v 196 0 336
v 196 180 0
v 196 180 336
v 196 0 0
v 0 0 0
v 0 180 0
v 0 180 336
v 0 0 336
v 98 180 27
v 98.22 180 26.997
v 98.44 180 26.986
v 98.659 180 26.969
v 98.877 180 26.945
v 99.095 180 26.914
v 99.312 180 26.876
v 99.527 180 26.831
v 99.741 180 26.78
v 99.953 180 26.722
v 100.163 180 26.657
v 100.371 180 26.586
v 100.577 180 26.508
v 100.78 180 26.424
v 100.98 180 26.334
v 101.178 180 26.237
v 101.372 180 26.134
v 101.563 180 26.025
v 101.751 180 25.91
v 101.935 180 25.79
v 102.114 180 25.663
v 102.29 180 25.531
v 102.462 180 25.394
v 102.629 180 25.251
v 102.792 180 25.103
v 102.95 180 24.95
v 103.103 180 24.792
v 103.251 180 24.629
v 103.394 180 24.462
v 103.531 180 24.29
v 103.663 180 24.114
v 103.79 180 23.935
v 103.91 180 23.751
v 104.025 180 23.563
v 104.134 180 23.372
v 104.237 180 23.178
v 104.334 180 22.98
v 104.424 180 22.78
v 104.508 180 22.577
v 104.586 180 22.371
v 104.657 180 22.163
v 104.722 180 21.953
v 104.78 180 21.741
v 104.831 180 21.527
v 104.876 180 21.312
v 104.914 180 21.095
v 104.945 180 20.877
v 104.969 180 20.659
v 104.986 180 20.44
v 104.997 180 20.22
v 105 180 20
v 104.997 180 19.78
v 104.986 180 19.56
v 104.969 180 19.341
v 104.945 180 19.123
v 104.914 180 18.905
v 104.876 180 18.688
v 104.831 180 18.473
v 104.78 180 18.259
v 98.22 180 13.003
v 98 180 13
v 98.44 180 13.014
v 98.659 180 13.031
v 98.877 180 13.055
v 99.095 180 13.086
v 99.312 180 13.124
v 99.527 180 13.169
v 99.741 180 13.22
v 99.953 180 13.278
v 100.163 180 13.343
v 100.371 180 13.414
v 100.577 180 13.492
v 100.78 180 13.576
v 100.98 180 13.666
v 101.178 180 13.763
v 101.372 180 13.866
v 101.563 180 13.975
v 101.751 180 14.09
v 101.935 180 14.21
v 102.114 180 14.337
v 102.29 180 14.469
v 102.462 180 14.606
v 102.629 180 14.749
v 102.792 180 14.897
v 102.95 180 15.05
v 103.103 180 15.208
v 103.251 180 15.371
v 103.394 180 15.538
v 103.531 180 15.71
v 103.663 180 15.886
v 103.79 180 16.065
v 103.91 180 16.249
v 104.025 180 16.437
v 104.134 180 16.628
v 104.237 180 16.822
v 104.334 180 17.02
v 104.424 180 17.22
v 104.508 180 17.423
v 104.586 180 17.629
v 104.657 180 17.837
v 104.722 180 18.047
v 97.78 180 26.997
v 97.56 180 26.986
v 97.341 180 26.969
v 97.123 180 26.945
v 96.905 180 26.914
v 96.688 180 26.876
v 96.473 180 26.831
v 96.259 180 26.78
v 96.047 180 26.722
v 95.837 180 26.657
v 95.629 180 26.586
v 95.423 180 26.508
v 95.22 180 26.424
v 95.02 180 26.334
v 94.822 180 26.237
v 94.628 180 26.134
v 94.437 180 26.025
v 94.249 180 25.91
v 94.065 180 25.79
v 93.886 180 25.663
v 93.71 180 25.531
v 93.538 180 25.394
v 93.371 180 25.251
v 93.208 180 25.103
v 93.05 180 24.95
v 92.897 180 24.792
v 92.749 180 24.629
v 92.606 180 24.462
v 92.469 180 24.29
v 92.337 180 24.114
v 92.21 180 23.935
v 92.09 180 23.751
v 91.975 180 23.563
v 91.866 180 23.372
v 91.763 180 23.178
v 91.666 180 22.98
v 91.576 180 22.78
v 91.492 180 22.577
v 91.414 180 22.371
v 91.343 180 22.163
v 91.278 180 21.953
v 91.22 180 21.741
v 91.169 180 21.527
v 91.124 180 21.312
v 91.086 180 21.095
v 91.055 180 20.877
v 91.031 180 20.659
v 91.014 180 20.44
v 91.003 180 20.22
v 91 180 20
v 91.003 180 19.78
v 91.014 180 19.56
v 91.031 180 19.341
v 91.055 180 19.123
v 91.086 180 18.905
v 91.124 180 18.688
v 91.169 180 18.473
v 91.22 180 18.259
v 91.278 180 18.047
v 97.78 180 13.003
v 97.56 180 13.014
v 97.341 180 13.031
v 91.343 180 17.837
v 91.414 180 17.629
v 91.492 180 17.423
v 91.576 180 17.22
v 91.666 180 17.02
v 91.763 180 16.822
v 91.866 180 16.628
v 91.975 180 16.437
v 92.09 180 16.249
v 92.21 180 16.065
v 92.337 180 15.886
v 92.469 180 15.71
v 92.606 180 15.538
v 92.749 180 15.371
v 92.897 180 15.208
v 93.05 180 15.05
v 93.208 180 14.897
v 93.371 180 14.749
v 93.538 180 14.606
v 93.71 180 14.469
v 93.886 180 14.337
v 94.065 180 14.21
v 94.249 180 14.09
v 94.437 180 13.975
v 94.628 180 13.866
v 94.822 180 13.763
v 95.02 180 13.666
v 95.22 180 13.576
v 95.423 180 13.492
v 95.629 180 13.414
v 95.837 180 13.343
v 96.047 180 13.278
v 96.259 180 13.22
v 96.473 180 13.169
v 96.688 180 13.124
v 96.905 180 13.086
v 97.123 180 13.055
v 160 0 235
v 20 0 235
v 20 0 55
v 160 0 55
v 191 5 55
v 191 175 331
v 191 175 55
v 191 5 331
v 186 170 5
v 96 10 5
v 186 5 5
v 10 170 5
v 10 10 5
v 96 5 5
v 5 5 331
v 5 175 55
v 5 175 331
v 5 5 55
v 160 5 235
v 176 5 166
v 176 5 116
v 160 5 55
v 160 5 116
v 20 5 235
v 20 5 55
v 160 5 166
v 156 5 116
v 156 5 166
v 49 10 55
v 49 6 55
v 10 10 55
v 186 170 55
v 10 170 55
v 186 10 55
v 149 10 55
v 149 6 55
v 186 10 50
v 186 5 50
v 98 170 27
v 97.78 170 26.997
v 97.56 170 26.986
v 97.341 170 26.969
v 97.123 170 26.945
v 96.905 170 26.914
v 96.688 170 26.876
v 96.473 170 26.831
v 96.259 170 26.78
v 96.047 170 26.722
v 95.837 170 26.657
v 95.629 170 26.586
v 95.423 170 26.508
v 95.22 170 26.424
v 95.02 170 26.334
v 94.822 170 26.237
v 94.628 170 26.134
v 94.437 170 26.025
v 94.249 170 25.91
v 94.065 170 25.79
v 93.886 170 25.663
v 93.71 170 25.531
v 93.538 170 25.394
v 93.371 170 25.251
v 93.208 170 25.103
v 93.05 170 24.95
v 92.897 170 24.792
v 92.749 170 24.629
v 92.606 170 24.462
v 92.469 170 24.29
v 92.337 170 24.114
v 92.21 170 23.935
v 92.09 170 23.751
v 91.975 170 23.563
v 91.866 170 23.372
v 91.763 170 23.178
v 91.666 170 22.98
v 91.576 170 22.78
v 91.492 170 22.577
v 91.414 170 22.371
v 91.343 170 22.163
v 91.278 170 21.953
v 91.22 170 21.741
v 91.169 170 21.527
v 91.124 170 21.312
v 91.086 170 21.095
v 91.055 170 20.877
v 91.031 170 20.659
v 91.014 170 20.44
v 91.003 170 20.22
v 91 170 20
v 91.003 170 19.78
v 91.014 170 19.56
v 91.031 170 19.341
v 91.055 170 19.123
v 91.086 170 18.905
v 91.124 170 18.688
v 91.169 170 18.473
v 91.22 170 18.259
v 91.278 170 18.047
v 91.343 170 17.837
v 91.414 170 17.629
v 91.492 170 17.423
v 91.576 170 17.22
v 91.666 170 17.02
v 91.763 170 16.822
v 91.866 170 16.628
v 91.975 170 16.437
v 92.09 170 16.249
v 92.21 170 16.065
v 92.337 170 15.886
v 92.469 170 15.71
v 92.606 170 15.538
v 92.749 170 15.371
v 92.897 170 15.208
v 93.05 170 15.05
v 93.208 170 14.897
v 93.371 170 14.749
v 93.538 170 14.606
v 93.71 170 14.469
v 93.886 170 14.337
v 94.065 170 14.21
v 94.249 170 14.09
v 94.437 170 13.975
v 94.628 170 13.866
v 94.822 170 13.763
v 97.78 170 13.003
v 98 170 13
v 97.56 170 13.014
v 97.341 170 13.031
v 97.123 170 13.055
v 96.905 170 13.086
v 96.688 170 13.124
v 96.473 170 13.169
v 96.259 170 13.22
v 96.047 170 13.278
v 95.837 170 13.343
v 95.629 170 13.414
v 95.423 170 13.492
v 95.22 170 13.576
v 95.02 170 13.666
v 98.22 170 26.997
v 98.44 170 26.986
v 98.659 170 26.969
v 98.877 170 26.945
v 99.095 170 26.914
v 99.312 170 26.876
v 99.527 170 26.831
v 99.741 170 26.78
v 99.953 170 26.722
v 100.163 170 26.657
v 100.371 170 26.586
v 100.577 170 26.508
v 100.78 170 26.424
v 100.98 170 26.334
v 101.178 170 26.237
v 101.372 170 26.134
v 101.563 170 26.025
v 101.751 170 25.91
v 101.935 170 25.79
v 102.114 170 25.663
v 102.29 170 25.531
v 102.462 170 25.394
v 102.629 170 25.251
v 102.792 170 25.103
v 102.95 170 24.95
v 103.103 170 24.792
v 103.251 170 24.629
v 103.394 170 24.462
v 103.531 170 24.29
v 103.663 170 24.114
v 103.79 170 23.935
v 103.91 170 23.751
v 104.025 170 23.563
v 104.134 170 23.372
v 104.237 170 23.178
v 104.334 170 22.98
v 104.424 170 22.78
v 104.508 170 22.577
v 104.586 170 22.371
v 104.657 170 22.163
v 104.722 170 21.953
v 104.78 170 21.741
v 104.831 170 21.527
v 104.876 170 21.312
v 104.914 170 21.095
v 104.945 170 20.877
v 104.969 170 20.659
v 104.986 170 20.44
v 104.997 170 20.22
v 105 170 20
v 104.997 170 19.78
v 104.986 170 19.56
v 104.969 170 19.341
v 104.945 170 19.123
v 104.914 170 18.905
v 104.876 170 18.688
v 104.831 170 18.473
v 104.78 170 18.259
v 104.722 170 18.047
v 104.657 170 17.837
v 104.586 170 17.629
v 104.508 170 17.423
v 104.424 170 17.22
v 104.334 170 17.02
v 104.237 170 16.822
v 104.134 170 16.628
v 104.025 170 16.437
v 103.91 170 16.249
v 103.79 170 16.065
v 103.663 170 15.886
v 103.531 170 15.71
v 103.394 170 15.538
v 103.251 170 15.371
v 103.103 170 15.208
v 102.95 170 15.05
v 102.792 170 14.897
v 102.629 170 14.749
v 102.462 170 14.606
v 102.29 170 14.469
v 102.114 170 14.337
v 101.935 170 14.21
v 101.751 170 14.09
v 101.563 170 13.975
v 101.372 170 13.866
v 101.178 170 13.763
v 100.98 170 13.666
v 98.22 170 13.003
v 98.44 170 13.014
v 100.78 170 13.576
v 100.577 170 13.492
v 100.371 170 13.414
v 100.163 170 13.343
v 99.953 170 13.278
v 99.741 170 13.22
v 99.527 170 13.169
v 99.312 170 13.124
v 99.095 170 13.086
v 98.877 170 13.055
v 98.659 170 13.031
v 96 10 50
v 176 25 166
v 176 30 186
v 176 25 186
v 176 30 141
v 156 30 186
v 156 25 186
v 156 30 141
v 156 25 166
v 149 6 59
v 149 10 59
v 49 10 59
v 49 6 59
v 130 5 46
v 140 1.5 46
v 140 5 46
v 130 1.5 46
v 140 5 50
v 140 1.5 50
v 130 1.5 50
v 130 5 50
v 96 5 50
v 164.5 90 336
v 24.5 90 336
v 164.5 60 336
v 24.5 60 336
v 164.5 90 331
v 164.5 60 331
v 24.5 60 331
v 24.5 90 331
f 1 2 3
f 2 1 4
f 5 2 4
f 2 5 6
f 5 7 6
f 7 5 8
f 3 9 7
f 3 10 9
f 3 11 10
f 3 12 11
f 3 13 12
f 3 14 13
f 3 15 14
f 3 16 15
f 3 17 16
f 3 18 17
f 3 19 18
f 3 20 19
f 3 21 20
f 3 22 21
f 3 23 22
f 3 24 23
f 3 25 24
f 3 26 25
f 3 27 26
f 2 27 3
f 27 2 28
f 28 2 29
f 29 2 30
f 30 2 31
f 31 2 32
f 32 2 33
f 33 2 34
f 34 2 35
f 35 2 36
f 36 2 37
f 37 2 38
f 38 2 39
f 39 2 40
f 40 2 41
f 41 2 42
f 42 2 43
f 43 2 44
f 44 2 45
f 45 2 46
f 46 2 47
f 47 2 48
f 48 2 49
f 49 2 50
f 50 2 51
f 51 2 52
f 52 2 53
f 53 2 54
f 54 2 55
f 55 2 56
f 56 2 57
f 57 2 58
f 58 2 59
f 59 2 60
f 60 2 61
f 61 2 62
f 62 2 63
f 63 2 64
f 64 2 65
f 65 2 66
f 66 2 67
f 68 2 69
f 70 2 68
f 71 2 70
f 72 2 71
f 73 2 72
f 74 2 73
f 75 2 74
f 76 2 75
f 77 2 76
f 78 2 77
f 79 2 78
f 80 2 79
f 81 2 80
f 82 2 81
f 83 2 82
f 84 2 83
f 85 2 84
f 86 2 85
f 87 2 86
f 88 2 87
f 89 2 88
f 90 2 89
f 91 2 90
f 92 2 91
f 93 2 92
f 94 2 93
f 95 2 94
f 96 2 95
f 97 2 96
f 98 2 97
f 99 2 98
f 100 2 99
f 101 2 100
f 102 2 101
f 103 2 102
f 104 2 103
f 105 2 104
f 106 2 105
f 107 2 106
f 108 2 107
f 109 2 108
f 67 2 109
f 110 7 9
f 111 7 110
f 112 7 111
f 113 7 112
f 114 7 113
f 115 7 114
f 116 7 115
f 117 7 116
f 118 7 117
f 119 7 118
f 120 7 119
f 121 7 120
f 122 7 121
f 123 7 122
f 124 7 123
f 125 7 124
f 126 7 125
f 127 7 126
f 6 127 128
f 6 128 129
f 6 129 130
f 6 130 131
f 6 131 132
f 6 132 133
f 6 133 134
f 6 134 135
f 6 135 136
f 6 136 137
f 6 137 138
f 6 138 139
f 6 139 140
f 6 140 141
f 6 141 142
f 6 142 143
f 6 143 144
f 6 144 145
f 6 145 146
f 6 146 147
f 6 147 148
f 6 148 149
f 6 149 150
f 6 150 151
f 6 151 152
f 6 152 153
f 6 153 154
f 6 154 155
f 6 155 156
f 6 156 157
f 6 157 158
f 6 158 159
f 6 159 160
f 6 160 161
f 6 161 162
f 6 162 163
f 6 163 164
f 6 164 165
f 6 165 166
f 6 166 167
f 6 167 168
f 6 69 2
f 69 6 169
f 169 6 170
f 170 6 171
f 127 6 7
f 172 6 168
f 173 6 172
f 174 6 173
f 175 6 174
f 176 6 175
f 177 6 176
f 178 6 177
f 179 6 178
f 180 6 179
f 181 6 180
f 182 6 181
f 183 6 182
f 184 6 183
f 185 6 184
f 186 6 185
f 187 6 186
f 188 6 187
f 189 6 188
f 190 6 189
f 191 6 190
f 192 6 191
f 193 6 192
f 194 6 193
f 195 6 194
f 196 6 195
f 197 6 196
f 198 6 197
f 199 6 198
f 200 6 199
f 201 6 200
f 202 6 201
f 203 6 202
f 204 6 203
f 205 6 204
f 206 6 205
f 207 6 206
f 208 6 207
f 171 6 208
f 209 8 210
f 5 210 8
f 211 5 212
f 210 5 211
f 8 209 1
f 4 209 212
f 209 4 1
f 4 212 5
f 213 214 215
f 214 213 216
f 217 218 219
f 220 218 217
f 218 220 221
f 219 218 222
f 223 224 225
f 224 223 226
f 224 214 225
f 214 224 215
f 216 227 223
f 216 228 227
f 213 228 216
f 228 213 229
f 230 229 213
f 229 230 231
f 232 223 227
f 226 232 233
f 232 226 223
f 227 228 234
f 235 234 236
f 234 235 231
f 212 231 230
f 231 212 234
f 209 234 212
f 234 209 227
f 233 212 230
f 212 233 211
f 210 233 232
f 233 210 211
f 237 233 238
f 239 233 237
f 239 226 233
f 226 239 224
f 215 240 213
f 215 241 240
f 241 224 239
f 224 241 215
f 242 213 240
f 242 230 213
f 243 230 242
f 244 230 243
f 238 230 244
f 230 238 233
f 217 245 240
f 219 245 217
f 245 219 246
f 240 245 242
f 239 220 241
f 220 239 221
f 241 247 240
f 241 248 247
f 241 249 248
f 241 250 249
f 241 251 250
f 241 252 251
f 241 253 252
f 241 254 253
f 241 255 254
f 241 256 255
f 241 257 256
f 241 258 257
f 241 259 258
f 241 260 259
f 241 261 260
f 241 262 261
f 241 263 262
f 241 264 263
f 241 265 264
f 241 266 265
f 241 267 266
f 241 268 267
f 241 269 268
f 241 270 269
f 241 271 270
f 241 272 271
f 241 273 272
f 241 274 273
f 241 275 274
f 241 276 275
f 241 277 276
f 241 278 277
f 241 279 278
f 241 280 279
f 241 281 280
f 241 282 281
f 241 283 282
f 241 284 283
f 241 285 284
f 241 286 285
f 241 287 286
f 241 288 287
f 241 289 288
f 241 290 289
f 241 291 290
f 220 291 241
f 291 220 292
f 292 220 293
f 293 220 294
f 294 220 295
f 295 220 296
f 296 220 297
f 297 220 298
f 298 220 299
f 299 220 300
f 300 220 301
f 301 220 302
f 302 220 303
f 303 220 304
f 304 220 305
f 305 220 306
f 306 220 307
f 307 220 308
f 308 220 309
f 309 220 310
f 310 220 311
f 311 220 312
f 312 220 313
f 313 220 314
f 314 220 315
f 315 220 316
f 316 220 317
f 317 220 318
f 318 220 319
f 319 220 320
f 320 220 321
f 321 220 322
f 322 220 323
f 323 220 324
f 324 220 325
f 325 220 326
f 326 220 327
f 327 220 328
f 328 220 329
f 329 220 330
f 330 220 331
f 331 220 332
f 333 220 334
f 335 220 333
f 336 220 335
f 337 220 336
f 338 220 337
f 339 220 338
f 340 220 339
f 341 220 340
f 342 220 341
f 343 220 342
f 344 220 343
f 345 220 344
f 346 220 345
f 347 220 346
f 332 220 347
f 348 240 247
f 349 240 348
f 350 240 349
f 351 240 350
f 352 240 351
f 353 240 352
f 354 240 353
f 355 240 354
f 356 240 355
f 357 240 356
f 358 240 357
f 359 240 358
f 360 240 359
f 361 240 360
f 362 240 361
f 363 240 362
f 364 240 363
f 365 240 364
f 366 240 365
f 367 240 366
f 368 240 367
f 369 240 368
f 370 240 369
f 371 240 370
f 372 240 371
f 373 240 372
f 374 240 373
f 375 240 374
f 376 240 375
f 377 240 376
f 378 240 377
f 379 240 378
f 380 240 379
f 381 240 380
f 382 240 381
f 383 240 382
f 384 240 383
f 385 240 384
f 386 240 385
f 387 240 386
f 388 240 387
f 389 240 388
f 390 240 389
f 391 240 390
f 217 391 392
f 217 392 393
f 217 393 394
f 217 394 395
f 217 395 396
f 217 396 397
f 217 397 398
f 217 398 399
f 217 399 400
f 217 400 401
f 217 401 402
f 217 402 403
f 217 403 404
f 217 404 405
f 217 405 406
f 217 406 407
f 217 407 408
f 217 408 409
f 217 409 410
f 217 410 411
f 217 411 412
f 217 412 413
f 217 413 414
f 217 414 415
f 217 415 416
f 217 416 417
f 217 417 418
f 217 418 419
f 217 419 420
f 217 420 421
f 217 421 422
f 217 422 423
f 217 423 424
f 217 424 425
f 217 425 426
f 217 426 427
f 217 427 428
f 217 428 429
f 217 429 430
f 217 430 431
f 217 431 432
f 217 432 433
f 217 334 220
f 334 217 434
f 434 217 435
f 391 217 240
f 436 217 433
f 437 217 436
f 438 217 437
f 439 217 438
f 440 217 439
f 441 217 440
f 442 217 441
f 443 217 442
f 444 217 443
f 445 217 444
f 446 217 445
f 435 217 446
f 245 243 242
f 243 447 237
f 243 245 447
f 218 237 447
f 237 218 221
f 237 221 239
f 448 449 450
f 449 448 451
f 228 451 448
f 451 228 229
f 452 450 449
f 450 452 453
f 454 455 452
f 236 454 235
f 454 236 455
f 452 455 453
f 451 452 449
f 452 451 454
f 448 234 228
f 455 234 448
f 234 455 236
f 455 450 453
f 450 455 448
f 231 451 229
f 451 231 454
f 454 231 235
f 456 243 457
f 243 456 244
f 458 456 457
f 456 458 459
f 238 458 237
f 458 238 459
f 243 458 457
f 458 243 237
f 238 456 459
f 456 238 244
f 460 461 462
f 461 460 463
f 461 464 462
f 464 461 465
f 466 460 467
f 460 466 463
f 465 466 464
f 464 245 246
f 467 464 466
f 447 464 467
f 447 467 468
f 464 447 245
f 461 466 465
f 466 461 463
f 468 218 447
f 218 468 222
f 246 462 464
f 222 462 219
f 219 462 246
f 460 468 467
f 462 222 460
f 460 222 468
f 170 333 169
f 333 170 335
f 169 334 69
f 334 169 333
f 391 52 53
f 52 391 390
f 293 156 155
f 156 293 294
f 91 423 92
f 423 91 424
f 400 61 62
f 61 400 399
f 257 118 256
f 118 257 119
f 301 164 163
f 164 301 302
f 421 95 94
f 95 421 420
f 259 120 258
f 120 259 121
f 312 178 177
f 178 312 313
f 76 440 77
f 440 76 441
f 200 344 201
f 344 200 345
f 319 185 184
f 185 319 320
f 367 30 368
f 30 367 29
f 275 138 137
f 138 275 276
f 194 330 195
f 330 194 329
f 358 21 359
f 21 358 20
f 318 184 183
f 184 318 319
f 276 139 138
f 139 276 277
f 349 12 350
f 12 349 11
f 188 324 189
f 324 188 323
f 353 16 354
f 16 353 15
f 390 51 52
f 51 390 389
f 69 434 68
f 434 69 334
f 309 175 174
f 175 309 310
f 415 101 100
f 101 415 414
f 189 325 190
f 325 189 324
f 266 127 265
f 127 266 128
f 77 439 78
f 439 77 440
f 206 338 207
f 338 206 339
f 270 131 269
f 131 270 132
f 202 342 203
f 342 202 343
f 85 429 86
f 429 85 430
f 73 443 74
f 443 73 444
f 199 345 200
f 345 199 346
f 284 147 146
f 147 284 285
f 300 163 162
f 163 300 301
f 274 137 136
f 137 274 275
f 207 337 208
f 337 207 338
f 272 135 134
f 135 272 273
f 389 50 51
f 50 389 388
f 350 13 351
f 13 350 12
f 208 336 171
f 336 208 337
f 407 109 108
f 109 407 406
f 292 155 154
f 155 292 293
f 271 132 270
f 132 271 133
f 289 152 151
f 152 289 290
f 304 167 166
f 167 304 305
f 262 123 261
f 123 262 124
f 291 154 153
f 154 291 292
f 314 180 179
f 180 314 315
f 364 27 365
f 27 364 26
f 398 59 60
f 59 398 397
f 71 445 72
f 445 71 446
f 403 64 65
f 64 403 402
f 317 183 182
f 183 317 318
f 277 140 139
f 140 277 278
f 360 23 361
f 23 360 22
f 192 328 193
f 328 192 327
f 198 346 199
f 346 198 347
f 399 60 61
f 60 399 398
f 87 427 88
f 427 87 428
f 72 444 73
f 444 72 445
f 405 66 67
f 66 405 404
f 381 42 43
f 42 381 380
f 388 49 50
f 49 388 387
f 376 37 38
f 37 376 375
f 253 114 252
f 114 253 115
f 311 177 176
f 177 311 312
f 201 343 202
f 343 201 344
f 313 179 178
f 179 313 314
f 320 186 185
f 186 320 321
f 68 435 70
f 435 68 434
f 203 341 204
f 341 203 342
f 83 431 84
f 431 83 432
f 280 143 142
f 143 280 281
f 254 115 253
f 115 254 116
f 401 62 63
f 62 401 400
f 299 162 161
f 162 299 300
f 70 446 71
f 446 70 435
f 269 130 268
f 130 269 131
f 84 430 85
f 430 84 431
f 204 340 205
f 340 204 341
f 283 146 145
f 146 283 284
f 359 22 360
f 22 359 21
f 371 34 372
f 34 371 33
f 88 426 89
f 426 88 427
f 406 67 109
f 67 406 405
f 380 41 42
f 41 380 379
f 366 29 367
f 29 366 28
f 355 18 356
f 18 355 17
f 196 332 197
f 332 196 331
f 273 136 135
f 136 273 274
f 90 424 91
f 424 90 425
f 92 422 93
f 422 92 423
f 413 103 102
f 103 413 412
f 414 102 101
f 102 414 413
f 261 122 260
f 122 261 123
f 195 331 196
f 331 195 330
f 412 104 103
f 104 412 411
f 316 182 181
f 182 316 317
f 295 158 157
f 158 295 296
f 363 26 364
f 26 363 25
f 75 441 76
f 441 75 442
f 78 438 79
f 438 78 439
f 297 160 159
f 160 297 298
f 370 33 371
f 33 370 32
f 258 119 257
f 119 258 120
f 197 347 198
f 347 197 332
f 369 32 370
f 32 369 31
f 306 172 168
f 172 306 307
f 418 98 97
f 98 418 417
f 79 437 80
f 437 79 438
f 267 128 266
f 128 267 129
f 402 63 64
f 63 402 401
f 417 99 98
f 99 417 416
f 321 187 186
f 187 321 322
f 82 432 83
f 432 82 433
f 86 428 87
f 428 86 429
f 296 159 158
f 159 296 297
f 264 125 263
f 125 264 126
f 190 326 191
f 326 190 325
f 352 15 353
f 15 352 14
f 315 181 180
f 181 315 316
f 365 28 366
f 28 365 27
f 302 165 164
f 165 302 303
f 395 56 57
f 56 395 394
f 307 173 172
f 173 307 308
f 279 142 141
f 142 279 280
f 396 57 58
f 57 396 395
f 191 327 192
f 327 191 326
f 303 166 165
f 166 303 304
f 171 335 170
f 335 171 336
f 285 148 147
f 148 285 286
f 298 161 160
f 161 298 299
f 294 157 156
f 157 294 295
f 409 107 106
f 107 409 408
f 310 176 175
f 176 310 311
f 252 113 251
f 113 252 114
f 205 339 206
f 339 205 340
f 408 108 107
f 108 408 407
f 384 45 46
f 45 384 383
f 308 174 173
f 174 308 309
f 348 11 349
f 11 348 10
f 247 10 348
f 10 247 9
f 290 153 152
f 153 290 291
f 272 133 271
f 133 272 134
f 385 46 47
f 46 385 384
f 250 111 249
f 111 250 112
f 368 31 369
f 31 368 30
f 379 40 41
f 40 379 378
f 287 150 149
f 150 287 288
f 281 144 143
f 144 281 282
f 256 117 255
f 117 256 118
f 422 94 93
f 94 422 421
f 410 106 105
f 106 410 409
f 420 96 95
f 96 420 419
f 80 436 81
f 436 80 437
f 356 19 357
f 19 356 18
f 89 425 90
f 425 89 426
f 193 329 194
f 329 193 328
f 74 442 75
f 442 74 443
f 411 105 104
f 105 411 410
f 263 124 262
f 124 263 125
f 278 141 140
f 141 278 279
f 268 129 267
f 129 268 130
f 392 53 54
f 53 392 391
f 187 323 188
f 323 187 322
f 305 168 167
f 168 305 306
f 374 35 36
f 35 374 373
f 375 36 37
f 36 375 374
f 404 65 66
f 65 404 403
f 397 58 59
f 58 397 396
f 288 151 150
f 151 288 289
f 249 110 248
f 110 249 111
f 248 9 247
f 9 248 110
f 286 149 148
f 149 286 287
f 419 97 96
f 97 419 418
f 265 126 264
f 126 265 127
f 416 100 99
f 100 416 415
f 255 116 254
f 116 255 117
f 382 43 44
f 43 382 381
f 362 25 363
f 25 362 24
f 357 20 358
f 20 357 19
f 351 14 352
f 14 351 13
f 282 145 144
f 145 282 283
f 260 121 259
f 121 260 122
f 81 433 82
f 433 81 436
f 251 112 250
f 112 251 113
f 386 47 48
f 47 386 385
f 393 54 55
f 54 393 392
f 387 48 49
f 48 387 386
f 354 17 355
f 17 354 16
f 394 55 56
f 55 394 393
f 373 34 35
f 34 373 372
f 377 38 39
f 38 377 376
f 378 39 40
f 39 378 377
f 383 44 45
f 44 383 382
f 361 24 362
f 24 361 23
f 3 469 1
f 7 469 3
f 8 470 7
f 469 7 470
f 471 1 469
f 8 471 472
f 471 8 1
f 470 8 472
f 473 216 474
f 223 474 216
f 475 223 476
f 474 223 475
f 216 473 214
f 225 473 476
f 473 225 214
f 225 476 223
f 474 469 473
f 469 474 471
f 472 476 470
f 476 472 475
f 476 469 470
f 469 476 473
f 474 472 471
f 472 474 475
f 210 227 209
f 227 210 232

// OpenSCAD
    anchoBuzon=196;
    fondoBuzon=180;
    altoBuzon =196;
    anchoPared=5;
    anchoPuerta=140;
    altoPuerta=180;
    margen=20;
    margenAlto=55;
    
// TAPA BUZON


//LECTOR
    anchoLector =45;
    altoLector = 90;
    grosorLector = 5;
// AGUJERO ALIMENTACION
diametroAlimentacion = 14;
module base(){

    difference(){
        cube([anchoBuzon,fondoBuzon,altoBuzon]);
        translate([anchoPared,anchoPared,anchoPared])
            cube([anchoBuzon-anchoPared*2,fondoBuzon-anchoPared*2,altoBuzon]);
        translate([anchoBuzon-(anchoBuzon-margen),0,altoBuzon-(altoBuzon-margenAlto)])
            #cube([anchoPuerta,50,altoPuerta]);
            
    }
        
        difference(){
            translate([anchoPared,anchoPared,0])
                cube([anchoBuzon-anchoPared*2,fondoBuzon-anchoPared*2,margenAlto]);
            translate([anchoPared*2,anchoPared*2,0])
                cube([anchoBuzon-anchoPared*4,fondoBuzon-anchoPared*4,margenAlto]);
        }

        
        
    
    translate([anchoBuzon-40,anchoPared,altoBuzon-80])
        cerradura();
    translate([anchoBuzon/4,anchoPared+1,margenAlto])
        cube([100,anchoPared-1,anchoPared-1]);    
}
module baseConLectorYCerradura(){
    difference(){
        base();
        translate([(anchoBuzon/2)-2,anchoPared,anchoLector+anchoPared])
                lector();
    }
}


//cerradura();
module lector(){

    
    rotate([0,90,0])
        union(){
            translate([0,-3.5,34])
                cube([4,5,10]);
            cube([anchoLector,grosorLector,altoLector]);
        }
}

altoCerradura = 70;
module cerradura(){
    difference(){

        difference(){
            
            cube([20,25,altoCerradura]);
                translate([0,0,altoCerradura])
                    rotate([0,90,0])
                        cube([20,20,40]);

        }
            rotate([45,0,0])
                translate([0,0,-20])
                    cube([200,250,20]);
    }
}
module baseCompleta(){
    difference(){
        baseConLectorYCerradura();
        rotate([0,90,90])
            translate([-20,-anchoBuzon/2,fondoBuzon/2])
                #cylinder(r = diametroAlimentacion/2, h = 100, $fn=200);
    }
}
//************************ TAPA *******************************************

baseCompleta();
translate([0,0,altoBuzon])
tapa();


altoTapa = 140;
anchoRanura = 140;
fondoRanura = 30;
desplazamientoRanura = 60;
module tapa(){
    difference(){
        cube([anchoBuzon,fondoBuzon,altoTapa]);
        translate([anchoPared,anchoPared,0])
            cube([anchoBuzon-anchoPared*2,fondoBuzon-anchoPared*2,altoTapa-anchoPared]);
        translate([anchoBuzon/8,desplazamientoRanura,altoTapa-anchoPared])
            cube([anchoRanura,fondoRanura,100]);
        translate([anchoBuzon-(anchoBuzon-margen),0,0])
            cube([anchoPuerta,anchoPared*2,(margenAlto+altoPuerta)-altoBuzon]);
    }
}



module encaje(anchoEncaje,fondoEncaje,altoEncaje){
    difference(){
        cube([anchoEncaje,fondoEncaje,altoEncaje]);
            translate([0,10,-12])
        rotate([40,0,0])
            cube([anchoEncaje,4,altoEncaje*2]);
    }
}
 module tapaConEncajes(){
    fondoEncaje = 3;
    anchoEncaje = 40;
    // mirado dessde detras de la puerta
    // primer encaje justo encima de la puerta
    rotate([0,180,180])
        translate([anchoBuzon/2-20,-anchoPared-fondoEncaje,-margenAlto+5])
            encaje(40,fondoEncaje,15);

    // encaje alante a la derecha
    rotate([0,180,180])
        translate([anchoBuzon-anchoPared-fondoEncaje,-anchoPared,-20])
            rotate([0,0,-90])
                    encaje(40,fondoEncaje,30);
    // encaje atras a la derecha
    rotate([0,180,180])
        translate([anchoBuzon-anchoPared-fondoEncaje,-fondoBuzon+anchoEncaje+anchoPared,-20])
            rotate([0,0,-90])
                    encaje(40,fondoEncaje,30);

    // encaje alante a la izquierda
    rotate([0,180,180])
        translate([fondoEncaje+anchoPared,-anchoPared-anchoEncaje,-20])
            rotate([0,0,90])
                    encaje(anchoEncaje,fondoEncaje,30);
                    
    // encaje atras a la izquierda                
    rotate([0,180,180])
        translate([fondoEncaje+anchoPared,-fondoBuzon+anchoPared,-20])
            rotate([0,0,90])
                    encaje(anchoEncaje,fondoEncaje,30);

    // encaje de atras central
    anchoEncaje2=50;
    rotate([0,180,180])
        translate([anchoBuzon/2+30,-fondoBuzon+anchoPared+fondoEncaje,-20])
                rotate([0,0,180])
                    encaje(anchoEncaje2,fondoEncaje,30);
    tapa();

}
// ****************** PUERTA ************************
tecladoDistIzq = 45;
tecladoAltura = 35;
module puerta(){
    difference(){
        cube([anchoPuerta-2,altoPuerta-2,anchoPared-1]);

        translate([tecladoDistIzq,tecladoAltura,-10])
        rotate([-15,0,0])
        cube([24,4,20]);

        translate([anchoPuerta-cerraduraDistanciaDerecha-4.5,cerraduraAltura+20,-10])
        cube([10,3.5,20]);



        cerraduraDistanciaDerecha = 30;
        cerraduraAltura = 120.5;

        translate([anchoPuerta-cerraduraDistanciaDerecha,cerraduraAltura,-10])
        cylinder(h = 50,r=13/2, $fn=200);
    }
}

// ******************** CERROJO *************
module cerrojo(){
    largoCerrojo = 50;
    anchoCerrojo = 25;
    altoCerrojo = 5;

    diametroCerrojo = 20;
    difference(){
        difference(){
            union(){
                cube([largoCerrojo,anchoCerrojo,altoCerrojo]);
                translate([largoCerrojo-10,0,3])
                cube([10,anchoCerrojo,altoCerrojo+4]);

                translate([diametroCerrojo/2,diametroCerrojo/2+2,0])
                    cylinder(r = diametroCerrojo/2,$fn=200, h = 8);


            }
        translate([diametroCerrojo/2,diametroCerrojo/2+2,0])
            #cylinder(r = 5/2,$fn=200, h = 20);
        }

        translate([22,0,0])
        cube([30,17,30]);
    }
}

anchoTapaBase = anchoBuzon-(anchoPared*2)-2;
fondoTapaBase = fondoBuzon-(anchoPared*2)-5;
module tapaMicrocontroladores(){
    difference(){
        cube([anchoTapaBase,fondoTapaBase,2]);
            translate([42,0,-1])
                cube([110,anchoPared+1,20]);
            
            translate([10,15,-1])
            #cube([10,5,50]);
            
            translate([15,30,-1])
            #cube([30,8,50]);
            
             translate([15,30,-1])
            #cube([30,8,50]);
            
            translate([60,40,-1])
            cylinder(h=200,r=17/2,$fn=200);
            
             translate([anchoTapaBase-20,20,-1])
            #cube([10,8,50]);
            
            translate([fondoTapaBase-50,anchoTapaBase-70,-1])
            #cylinder(h=200,r=17/2,$fn=200);
       }
}
